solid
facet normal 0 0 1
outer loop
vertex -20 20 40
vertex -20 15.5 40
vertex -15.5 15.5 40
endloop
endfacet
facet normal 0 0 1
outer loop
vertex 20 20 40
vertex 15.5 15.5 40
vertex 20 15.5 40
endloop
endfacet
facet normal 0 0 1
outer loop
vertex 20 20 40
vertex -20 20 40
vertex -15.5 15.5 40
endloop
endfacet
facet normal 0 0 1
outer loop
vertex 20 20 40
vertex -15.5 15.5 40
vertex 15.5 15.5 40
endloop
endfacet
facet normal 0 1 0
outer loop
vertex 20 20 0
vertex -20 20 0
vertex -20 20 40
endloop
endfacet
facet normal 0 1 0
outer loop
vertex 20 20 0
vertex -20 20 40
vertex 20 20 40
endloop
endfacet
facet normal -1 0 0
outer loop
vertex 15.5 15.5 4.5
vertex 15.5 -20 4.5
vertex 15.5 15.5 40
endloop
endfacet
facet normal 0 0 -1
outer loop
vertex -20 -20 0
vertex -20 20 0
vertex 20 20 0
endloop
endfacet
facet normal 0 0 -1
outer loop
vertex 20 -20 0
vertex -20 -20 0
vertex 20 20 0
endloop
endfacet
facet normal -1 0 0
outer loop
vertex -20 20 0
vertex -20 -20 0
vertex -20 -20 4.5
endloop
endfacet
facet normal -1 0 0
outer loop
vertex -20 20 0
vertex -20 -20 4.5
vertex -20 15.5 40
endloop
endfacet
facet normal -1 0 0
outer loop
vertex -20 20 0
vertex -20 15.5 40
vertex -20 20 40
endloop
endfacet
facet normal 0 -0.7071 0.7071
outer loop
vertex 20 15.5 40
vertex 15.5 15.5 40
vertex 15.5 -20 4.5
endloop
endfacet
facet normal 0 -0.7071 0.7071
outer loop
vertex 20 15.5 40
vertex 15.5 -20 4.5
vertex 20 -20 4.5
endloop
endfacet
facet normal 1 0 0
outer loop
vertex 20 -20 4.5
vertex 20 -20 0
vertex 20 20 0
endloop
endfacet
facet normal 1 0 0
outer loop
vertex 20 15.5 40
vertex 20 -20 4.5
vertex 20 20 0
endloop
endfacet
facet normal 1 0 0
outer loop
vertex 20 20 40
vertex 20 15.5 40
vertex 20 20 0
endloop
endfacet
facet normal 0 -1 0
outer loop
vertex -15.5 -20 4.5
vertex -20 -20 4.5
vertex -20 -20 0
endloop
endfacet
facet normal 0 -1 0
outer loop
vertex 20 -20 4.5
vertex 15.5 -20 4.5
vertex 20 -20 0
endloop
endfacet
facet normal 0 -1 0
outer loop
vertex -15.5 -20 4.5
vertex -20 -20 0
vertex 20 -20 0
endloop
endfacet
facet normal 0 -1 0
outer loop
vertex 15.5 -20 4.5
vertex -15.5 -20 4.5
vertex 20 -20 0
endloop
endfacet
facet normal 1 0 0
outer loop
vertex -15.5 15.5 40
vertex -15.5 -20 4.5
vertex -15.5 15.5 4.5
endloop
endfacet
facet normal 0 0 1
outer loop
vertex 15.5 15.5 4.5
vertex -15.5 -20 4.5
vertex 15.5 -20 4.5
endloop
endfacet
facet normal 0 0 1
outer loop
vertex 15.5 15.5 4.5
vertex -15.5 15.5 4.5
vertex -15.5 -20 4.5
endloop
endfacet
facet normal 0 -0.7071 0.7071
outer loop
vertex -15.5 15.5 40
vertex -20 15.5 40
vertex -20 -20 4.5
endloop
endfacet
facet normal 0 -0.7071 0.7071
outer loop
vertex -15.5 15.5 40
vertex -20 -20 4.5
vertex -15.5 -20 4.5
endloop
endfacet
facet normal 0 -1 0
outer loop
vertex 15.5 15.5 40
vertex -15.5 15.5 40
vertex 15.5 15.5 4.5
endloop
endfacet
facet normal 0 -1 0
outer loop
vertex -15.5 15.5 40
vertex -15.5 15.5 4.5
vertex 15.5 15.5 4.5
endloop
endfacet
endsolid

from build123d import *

# Parameters (mm, degrees)
F0_W     = 40
F0_H     = 40
F1_DEPTH = 40
F2_T     = -4.5
F3_SIZE  = 35.5


with BuildPart() as f1:
    # F0 (on Top) → F1 (new body)
    with BuildSketch(Plane.XY):
        Rectangle(F0_W, F0_H)
    extrude(amount=F1_DEPTH)

    # F2
    f2_openings = [f1.faces().sort_by_distance(p)[0] for p in [
        (0, -20, 20),
        (0, 0, 40),
    ]]
    offset(amount=F2_T, openings=f2_openings)

    # F3
    f3_edges = [f1.edges().sort_by_distance(p)[0] for p in [
        (-17.75, -20, 40),
        (17.75, -20, 40),
    ]]
    chamfer(f3_edges, length=F3_SIZE)


solid = f1.part
